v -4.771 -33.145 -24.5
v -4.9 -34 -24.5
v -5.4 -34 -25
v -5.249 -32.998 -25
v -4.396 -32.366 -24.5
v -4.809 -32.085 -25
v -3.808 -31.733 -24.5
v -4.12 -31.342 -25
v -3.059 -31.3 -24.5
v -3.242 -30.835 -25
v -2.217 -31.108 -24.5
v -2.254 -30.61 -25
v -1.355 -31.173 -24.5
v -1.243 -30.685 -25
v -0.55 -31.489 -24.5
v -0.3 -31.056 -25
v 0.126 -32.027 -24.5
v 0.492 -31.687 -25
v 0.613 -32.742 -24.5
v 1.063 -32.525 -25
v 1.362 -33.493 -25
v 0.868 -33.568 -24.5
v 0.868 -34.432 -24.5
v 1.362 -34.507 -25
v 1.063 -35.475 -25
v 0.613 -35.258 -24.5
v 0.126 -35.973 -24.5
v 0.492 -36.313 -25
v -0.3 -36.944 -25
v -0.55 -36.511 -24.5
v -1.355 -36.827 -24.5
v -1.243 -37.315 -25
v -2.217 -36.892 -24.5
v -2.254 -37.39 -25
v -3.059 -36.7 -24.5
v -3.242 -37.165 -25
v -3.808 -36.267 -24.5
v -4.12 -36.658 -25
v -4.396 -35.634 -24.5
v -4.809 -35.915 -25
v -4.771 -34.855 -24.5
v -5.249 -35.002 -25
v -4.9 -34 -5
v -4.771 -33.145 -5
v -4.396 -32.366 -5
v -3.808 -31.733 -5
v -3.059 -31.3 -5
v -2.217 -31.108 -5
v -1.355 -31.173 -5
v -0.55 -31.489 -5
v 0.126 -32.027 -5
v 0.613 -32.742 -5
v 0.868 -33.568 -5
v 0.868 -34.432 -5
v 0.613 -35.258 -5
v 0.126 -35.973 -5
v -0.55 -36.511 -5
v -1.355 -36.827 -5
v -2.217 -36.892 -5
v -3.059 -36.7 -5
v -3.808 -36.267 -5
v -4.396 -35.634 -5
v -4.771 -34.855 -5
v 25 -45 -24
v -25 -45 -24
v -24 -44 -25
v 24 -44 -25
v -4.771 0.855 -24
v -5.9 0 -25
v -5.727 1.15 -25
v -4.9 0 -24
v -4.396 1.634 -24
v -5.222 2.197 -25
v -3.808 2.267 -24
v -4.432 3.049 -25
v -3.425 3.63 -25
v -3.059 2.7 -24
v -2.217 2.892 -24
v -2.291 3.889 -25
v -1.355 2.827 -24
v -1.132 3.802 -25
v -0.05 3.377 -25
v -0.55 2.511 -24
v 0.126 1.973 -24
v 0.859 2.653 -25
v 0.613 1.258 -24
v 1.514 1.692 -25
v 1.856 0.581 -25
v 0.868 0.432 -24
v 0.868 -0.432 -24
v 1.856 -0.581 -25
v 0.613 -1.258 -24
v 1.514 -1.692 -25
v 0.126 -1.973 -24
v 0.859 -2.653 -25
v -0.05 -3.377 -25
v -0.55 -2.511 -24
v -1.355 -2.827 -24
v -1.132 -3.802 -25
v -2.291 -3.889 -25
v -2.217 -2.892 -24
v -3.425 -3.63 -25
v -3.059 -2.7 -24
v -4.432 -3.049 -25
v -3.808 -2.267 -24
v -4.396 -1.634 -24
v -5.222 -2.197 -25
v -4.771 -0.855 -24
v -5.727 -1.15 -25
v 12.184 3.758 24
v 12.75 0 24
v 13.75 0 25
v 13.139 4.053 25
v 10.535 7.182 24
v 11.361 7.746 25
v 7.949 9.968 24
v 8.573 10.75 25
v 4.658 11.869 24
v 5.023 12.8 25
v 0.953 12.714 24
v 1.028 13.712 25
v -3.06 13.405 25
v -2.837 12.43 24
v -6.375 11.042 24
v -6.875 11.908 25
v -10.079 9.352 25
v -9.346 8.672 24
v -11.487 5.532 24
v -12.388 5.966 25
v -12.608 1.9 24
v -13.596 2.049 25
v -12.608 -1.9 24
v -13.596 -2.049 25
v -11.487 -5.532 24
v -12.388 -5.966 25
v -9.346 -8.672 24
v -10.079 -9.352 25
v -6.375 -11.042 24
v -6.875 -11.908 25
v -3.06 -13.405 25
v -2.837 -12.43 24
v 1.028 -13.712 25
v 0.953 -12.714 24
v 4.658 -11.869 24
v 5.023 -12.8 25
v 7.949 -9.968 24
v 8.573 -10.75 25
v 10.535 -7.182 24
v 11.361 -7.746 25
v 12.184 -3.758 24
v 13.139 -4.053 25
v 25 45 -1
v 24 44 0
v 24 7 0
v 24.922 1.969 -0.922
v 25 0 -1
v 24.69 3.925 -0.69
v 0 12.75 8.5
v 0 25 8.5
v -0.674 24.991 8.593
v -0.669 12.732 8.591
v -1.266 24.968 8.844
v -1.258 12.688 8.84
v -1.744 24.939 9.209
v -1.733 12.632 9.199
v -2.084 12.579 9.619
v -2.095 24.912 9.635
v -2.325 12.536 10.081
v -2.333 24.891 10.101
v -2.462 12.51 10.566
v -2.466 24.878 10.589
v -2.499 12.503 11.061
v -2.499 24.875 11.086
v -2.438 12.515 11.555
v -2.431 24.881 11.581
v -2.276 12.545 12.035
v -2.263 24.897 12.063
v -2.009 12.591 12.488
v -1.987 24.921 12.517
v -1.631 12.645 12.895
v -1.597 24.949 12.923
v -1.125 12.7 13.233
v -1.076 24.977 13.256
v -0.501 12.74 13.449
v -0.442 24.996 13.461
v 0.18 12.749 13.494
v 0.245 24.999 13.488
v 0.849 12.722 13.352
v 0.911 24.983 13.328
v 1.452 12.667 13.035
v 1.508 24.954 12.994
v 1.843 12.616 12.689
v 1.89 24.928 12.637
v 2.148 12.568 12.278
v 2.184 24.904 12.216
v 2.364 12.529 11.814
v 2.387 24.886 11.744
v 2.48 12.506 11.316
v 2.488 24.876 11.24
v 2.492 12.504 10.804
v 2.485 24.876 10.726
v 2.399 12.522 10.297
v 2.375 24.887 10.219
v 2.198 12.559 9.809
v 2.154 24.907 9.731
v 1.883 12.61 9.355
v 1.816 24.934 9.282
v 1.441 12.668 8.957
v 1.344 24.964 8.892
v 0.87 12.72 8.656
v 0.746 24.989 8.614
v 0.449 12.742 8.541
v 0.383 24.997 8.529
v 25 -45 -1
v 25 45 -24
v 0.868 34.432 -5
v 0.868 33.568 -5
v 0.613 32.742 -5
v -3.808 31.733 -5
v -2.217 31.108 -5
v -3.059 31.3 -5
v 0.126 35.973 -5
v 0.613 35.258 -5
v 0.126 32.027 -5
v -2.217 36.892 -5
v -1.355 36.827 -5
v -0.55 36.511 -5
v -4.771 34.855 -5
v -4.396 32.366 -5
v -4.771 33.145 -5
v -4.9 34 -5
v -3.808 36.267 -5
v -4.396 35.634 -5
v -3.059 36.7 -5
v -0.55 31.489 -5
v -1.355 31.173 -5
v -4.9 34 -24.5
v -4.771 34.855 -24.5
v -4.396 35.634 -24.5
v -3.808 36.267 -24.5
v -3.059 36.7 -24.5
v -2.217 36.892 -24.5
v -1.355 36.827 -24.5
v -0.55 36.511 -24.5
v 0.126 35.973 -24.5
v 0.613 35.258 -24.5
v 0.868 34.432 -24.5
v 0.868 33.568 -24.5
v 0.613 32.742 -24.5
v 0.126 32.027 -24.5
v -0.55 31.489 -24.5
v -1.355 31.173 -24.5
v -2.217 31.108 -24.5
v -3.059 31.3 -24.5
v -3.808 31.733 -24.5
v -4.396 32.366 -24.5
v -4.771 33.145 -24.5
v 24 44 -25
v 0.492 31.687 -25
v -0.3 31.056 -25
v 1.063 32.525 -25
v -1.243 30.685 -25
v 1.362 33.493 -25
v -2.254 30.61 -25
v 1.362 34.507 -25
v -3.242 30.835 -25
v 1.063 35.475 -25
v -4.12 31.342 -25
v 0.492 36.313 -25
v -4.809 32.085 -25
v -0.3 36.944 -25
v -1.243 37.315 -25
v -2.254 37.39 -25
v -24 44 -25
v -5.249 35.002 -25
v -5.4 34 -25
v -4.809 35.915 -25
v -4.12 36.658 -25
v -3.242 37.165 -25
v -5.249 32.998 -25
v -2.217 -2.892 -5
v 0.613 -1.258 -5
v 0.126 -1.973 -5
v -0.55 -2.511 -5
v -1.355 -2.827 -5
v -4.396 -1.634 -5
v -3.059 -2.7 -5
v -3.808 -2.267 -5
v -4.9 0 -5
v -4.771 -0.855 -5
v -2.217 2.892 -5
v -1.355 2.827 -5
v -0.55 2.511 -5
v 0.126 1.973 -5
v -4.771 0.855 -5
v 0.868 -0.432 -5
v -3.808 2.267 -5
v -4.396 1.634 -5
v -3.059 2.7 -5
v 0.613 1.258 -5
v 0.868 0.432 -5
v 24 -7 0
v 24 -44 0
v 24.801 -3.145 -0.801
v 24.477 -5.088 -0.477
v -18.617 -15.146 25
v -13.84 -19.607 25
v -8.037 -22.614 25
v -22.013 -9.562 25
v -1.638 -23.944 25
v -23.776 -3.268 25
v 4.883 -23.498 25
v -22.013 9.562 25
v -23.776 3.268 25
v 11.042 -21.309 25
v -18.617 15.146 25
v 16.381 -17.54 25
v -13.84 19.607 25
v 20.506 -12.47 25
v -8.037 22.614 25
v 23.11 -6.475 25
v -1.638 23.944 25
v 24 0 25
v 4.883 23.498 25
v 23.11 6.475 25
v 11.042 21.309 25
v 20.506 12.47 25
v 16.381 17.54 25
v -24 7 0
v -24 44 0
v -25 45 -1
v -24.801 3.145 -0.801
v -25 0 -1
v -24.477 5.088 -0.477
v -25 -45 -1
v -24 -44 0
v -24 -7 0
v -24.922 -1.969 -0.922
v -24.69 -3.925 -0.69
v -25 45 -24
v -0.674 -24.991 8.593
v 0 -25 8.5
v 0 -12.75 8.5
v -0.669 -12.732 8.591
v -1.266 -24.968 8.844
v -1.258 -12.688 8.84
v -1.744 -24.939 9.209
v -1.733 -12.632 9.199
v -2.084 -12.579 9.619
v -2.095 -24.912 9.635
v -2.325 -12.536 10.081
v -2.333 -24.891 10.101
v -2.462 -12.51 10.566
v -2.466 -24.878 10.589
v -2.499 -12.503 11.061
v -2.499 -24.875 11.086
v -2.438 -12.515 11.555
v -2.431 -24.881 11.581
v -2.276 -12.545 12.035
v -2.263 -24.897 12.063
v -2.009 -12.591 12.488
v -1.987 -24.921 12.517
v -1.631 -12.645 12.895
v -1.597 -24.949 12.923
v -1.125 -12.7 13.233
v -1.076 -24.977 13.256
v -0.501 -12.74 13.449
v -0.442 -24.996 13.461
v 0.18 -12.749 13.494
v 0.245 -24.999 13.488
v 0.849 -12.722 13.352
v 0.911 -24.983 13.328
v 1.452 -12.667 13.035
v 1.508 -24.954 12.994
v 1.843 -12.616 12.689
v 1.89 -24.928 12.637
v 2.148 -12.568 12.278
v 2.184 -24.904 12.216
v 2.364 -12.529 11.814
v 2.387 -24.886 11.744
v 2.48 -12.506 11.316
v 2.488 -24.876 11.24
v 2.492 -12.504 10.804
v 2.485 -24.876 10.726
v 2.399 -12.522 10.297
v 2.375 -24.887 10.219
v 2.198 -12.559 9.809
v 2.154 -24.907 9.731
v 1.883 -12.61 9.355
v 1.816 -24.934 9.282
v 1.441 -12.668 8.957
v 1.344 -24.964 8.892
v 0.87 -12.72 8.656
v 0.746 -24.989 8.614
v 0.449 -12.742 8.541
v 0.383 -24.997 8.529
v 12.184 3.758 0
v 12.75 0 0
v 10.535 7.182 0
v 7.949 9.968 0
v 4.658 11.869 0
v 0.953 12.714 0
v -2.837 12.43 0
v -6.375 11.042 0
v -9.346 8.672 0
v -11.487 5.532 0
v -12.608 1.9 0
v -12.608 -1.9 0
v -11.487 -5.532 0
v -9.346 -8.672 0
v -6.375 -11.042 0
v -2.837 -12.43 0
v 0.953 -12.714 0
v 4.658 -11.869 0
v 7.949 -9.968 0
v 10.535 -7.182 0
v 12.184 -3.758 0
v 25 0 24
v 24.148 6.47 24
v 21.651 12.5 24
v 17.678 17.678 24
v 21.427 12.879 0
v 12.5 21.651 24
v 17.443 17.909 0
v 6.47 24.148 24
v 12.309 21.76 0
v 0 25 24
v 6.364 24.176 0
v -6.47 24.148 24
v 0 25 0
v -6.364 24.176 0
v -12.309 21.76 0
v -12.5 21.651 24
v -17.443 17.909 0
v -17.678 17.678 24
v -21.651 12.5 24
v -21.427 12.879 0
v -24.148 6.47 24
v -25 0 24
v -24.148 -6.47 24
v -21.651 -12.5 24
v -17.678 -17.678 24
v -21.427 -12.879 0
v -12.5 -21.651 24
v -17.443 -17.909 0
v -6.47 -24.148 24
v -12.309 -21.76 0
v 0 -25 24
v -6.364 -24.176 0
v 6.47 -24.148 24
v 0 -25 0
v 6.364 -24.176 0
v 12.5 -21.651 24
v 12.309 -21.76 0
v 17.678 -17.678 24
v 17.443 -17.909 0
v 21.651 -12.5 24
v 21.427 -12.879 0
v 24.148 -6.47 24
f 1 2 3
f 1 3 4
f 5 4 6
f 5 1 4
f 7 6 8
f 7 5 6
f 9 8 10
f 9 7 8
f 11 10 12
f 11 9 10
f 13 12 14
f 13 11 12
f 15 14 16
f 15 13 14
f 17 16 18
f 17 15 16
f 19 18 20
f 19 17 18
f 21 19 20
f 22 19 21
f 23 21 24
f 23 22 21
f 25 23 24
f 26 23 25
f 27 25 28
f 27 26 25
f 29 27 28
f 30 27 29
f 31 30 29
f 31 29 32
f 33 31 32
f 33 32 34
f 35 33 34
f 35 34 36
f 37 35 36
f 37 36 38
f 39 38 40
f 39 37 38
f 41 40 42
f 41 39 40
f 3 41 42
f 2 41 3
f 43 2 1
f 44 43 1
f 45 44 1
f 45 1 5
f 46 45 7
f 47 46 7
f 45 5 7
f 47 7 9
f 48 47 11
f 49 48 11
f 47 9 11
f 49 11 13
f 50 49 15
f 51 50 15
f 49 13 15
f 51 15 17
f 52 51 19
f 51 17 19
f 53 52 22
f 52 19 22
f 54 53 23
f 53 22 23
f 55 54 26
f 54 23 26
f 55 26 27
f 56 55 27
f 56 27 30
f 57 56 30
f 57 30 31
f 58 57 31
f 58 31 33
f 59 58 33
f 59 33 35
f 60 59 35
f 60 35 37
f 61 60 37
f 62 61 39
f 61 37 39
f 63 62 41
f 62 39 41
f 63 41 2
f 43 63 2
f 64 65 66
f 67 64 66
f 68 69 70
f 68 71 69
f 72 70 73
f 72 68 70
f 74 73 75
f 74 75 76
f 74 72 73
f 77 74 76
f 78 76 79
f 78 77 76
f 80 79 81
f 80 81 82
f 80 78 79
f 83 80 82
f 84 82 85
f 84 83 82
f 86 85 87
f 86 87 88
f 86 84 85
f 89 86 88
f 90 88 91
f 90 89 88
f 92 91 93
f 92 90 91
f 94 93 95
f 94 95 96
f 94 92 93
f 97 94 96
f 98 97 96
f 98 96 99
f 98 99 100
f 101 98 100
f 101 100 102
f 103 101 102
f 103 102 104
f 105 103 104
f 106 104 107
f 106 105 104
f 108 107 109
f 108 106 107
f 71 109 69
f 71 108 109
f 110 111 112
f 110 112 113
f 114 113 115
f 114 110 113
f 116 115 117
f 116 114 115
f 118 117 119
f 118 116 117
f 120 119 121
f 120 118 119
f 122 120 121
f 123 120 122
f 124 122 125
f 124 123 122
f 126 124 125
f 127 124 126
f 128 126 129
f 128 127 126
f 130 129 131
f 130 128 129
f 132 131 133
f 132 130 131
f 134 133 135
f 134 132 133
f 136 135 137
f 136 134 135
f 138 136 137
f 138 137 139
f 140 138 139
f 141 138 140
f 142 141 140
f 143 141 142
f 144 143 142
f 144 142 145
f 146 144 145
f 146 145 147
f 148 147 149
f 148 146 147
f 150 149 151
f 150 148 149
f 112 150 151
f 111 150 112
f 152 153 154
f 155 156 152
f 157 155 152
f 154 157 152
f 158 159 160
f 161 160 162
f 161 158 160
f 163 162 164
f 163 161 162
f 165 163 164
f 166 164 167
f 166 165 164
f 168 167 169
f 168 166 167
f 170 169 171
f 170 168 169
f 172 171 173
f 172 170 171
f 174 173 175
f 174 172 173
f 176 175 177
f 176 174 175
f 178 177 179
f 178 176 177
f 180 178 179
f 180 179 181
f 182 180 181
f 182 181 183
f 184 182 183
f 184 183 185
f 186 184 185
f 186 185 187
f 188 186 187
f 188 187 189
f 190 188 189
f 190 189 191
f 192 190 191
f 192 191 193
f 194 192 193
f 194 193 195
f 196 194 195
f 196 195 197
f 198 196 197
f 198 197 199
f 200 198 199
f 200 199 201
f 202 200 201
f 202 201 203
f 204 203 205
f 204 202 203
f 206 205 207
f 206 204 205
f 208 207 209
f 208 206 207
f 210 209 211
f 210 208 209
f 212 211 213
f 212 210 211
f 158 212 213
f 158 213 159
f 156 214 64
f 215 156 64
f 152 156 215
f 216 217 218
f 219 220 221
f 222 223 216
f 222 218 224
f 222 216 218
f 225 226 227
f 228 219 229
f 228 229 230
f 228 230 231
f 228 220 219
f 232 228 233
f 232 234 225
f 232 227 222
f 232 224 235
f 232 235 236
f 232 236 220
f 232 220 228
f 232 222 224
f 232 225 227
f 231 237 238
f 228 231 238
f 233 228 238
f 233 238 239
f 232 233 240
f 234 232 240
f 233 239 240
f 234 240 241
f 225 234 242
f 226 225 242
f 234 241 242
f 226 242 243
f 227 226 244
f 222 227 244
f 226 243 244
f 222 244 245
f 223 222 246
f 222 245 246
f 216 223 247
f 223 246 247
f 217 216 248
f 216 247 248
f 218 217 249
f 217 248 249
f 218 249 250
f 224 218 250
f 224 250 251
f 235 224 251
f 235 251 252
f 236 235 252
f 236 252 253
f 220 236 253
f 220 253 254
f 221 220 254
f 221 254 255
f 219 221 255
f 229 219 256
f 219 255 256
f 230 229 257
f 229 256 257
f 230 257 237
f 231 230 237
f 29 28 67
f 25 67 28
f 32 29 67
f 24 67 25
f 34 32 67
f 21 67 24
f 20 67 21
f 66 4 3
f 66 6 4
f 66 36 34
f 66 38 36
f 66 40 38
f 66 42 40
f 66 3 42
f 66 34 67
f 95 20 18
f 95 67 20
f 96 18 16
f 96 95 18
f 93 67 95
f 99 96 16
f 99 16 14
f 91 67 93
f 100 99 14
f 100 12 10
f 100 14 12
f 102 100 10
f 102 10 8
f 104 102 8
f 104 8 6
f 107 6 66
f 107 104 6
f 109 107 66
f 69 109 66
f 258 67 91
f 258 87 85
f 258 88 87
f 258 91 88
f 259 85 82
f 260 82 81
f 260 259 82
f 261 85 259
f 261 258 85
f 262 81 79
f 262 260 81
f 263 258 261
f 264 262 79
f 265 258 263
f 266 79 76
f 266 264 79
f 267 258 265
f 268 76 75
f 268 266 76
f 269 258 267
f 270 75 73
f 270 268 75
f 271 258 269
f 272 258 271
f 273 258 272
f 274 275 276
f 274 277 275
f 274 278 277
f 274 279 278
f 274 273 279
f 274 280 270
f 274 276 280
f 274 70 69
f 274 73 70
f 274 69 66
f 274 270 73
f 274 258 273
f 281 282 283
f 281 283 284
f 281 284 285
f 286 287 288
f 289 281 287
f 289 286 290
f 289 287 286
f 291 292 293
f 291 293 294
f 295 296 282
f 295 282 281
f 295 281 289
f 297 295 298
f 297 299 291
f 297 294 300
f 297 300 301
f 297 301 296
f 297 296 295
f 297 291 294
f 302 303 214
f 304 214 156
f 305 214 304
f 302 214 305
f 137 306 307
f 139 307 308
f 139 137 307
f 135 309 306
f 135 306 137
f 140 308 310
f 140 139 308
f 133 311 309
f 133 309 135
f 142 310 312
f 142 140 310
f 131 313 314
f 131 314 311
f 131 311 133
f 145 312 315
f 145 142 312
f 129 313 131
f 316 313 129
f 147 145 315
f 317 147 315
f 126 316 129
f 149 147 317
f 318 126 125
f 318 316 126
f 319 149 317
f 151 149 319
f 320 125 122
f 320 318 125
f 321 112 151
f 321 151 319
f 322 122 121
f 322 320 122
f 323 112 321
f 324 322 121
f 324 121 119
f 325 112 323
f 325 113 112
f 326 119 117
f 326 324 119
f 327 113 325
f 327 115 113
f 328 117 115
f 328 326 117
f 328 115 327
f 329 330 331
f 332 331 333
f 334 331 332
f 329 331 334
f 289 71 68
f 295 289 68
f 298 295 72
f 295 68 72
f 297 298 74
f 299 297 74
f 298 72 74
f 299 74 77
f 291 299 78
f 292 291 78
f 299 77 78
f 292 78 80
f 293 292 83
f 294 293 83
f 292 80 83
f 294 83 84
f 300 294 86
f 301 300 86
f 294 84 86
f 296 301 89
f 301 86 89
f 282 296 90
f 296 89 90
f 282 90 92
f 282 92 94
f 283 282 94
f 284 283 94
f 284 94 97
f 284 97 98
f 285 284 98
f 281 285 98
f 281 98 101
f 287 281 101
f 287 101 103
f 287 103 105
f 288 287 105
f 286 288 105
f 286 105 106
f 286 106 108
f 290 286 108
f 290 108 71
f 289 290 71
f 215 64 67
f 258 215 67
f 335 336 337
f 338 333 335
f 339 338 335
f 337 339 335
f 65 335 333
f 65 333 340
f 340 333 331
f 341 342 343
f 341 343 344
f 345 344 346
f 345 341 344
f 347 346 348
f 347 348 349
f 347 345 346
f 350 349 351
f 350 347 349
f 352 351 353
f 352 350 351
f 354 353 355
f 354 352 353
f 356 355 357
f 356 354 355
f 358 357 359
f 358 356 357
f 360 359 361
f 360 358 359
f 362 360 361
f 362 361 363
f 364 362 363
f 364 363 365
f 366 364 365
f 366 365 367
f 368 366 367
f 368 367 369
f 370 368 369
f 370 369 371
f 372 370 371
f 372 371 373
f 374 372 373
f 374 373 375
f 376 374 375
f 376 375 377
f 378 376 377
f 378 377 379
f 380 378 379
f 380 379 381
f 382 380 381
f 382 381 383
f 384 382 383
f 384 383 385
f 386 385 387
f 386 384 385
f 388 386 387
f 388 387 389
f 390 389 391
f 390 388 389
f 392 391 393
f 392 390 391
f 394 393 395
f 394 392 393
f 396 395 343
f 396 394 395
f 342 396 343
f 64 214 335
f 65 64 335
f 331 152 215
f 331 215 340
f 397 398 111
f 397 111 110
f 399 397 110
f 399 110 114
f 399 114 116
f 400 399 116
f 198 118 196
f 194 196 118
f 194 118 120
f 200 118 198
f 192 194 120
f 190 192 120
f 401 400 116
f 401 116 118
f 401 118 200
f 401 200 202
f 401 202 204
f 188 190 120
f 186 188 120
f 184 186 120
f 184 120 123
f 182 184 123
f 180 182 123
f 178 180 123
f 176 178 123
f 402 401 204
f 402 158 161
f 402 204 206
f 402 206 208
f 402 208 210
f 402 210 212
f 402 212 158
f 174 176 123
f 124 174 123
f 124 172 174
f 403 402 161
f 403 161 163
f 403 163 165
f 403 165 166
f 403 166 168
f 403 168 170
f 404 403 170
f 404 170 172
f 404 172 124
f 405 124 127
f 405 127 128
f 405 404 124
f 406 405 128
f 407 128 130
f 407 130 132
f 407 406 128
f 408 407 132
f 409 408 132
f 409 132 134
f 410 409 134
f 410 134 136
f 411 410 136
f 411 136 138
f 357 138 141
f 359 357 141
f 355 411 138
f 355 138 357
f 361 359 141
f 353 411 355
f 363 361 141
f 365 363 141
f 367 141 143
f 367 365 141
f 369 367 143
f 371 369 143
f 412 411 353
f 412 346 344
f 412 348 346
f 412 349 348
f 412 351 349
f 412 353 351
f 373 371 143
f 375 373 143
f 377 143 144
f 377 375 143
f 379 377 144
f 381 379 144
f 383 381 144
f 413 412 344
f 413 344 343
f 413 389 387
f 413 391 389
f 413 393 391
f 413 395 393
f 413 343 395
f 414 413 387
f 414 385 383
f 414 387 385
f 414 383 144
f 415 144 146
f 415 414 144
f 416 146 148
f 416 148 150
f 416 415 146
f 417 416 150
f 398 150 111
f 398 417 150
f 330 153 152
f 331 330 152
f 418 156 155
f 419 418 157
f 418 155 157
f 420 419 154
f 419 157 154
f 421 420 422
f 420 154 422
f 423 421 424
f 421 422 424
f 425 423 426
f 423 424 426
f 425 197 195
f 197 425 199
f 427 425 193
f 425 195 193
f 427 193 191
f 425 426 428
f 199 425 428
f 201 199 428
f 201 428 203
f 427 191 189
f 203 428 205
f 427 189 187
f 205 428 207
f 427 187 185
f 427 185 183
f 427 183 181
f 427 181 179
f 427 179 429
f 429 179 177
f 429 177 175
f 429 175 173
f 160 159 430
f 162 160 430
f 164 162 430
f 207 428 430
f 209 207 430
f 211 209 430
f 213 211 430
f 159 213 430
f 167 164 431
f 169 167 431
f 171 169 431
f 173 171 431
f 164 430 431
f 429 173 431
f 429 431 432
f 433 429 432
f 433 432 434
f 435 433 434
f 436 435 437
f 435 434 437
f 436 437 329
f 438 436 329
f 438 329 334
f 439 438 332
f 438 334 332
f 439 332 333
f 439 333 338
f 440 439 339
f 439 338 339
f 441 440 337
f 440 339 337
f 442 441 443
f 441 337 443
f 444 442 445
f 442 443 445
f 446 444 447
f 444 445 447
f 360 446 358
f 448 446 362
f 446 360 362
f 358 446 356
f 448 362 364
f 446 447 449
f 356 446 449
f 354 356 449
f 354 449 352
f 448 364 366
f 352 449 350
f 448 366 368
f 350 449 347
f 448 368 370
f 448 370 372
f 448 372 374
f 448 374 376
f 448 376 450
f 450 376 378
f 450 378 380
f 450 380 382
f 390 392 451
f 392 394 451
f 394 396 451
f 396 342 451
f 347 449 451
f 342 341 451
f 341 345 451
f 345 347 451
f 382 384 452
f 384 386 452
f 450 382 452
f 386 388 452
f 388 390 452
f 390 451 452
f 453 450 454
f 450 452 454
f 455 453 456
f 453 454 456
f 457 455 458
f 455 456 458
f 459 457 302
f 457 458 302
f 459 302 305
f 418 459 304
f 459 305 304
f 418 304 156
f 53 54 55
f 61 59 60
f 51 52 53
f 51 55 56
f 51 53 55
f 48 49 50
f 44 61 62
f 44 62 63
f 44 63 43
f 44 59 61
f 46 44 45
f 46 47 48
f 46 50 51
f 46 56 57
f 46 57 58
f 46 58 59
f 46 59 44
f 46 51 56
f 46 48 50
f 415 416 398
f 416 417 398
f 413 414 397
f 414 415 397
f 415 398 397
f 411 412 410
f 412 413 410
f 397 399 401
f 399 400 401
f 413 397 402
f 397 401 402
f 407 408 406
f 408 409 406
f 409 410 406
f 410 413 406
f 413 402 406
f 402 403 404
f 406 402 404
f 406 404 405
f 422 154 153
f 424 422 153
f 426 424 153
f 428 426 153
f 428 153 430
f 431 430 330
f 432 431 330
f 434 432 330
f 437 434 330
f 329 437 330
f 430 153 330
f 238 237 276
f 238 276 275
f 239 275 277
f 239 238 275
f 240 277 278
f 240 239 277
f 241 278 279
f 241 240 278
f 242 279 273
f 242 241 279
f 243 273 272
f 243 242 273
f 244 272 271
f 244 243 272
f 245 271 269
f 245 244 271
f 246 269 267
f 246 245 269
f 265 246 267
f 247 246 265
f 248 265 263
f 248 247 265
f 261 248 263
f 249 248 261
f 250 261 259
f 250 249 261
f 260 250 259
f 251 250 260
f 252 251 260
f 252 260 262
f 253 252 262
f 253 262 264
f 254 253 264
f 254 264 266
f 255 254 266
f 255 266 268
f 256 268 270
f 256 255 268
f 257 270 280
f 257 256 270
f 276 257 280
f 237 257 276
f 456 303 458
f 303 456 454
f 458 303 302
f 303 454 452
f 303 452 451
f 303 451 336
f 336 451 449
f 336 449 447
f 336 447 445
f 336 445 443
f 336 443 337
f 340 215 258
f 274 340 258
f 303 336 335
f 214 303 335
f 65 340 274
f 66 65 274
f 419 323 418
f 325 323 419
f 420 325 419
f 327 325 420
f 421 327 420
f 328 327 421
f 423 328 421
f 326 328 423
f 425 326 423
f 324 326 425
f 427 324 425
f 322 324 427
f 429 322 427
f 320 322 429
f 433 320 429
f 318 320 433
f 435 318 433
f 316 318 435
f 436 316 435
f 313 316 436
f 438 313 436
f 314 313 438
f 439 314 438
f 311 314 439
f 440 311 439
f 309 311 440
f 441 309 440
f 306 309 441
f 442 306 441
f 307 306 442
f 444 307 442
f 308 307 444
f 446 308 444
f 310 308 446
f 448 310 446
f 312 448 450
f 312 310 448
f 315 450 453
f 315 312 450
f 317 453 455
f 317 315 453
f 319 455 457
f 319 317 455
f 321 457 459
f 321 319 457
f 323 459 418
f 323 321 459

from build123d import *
from build123d.topology import SkipClean

# Parameters (mm, degrees)
SKETCH_1_R               = 25
SKETCH_1_R_2             = 12.75
EXTRUDE_1_DEPTH          = 25
CUT_EXTRUDE_1_DEPTH      = 30
CUT_EXTRUDE_1_DEPTH_BACK = 30
SKETCH_2_R               = 2.5
SKETCH_3_W               = 50
SKETCH_3_H               = 90
EXTRUDE_2_DEPTH          = 25
CHAMFER_1_SIZE           = 1
SKETCH_4_R               = 2.9
CUT_EXTRUDE_2_DEPTH      = 20
CHAMFER_2_SIZE           = 1
SKETCH_5_R               = 2.9
CUT_EXTRUDE_3_DEPTH      = 20
CHAMFER_3_SIZE           = 0.5


with BuildPart() as part:
    # 草图1 → 凸台-拉伸1 (new body)
    with BuildSketch(Plane.XY):
        Circle(SKETCH_1_R)
        Circle(SKETCH_1_R_2, mode=Mode.SUBTRACT)
    extrude(amount=EXTRUDE_1_DEPTH)

    # 草图2 → 切除-拉伸1 (cut, two sides: drawn at the far end of the back side and taken through both)
    with BuildSketch(Plane(origin=(0, 0, 0), x_dir=(1, 0, 0), z_dir=(0, 1, 0)).offset(-CUT_EXTRUDE_1_DEPTH_BACK)):
        with Locations(Location((0, -11, 0), (0, 0, 90))):
            Circle(SKETCH_2_R)
    extrude(amount=CUT_EXTRUDE_1_DEPTH + CUT_EXTRUDE_1_DEPTH_BACK, mode=Mode.SUBTRACT)

    # 草图3 → 凸台-拉伸2 (add)
    with BuildSketch(Plane(origin=(0, 0, 0), x_dir=(-1, 0, 0), z_dir=(0, 0, -1))):
        Rectangle(SKETCH_3_W, SKETCH_3_H)
    extrude(amount=EXTRUDE_2_DEPTH)

    # 倒角1
    chamfer_1_edges = [part.edges().sort_by_distance(p)[0] for p in [
        (-25, 0, 25),
        (-12.75, 0, 25),
    ]]
    chamfer(chamfer_1_edges, length=CHAMFER_1_SIZE)

    # 草图4 → 切除-拉伸2 (cut)
    with BuildSketch(Plane(origin=(0, 0, -25), x_dir=(-1, 0, 0), z_dir=(0, 0, -1))):
        with Locations((2, 0)):
            Circle(SKETCH_4_R)
    extrude(amount=-CUT_EXTRUDE_2_DEPTH, mode=Mode.SUBTRACT)

    # 倒角2
    # the kernel refuses this chamfer: 1 mm, written as the material it takes off along each edge
    with BuildSketch(Plane(origin=(25, 0, 0), x_dir=(-0.9996219169112968, 0, 0.02749587661058639), z_dir=(0, 1, 0))) as chamfer_2_piece_1_section:
        Polygon((CHAMFER_2_SIZE * 0.999621916911, -CHAMFER_2_SIZE * 0.0274958766106), (-CHAMFER_2_SIZE * 0.0274958766106, -CHAMFER_2_SIZE * 0.999621916911), (0, 0), align=None)
    chamfer_2_piece_1 = extrude(amount=47.571682988, mode=Mode.PRIVATE)
    chamfer_2_piece_1 = chamfer_2_piece_1 - Plane(origin=(0, 0, -0.337643677), x_dir=(1, 0, 0), z_dir=(0, 0, -1)) * Cylinder(25, 100, mode=Mode.PRIVATE)
    add(chamfer_2_piece_1, mode=Mode.SUBTRACT)
    with BuildSketch(Plane(origin=(25, -47.571682988, 0), x_dir=(-0.9996219169112968, 0, 0.02749587661058639), z_dir=(0, 1, 0))) as chamfer_2_piece_2_section:
        Polygon((CHAMFER_2_SIZE * 0.999621916911, -CHAMFER_2_SIZE * 0.0274958766106), (-CHAMFER_2_SIZE * 0.0274958766106, -CHAMFER_2_SIZE * 0.999621916911), (0, 0), align=None)
    chamfer_2_piece_2 = extrude(amount=47.571682988, mode=Mode.PRIVATE)
    chamfer_2_piece_2 = chamfer_2_piece_2 - Plane(origin=(0, 0, -0.337643676), x_dir=(1, 0, 0), z_dir=(0, 0, -1)) * Cylinder(25, 100, mode=Mode.PRIVATE)
    add(chamfer_2_piece_2, mode=Mode.SUBTRACT)
    with BuildSketch(Plane(origin=(-27.571682988, -45, 0), x_dir=(0, 0.9996219169112968, 0.027495876610586292), z_dir=(1, 0, 0)), Plane(origin=(27.571682988, 45, 0), x_dir=(0, -0.9996219169112968, 0.027495876610586292), z_dir=(-1, 0, 0)), Plane(origin=(-27.571682988, -45, -25), x_dir=(0, -0.0274958766105891, 0.9996219169112968), z_dir=(1, 0, 0)), Plane(origin=(27.571682988, 45, -25), x_dir=(0, 0.0274958766105891, 0.9996219169112968), z_dir=(-1, 0, 0))) as chamfer_2_piece_3:
        Polygon((CHAMFER_2_SIZE * 0.999621916911, -CHAMFER_2_SIZE * 0.0274958766106), (-CHAMFER_2_SIZE * 0.0274958766106, -CHAMFER_2_SIZE * 0.999621916911), (0, 0), align=None)
    extrude(amount=55.143365976, mode=Mode.SUBTRACT)
    with BuildSketch(Plane(origin=(-25, -1.3e-08, 0), x_dir=(0.9996219169112968, 0, 0.02749587661058639), z_dir=(0, -1, 0))) as chamfer_2_piece_4_section:
        Polygon((CHAMFER_2_SIZE * 0.999621916911, -CHAMFER_2_SIZE * 0.0274958766106), (-CHAMFER_2_SIZE * 0.0274958766106, -CHAMFER_2_SIZE * 0.999621916911), (0, 0), align=None)
    chamfer_2_piece_4 = extrude(amount=47.571682975, mode=Mode.PRIVATE)
    chamfer_2_piece_4 = chamfer_2_piece_4 - Plane(origin=(0, 0, -0.337643677), x_dir=(1, 0, 0), z_dir=(0, 0, -1)) * Cylinder(25, 100, mode=Mode.PRIVATE)
    add(chamfer_2_piece_4, mode=Mode.SUBTRACT)
    with BuildSketch(Plane(origin=(-25, 47.571682988, 0), x_dir=(0.9996219169112968, 0, 0.02749587661058639), z_dir=(0, -1, 0))) as chamfer_2_piece_5_section:
        Polygon((CHAMFER_2_SIZE * 0.999621916911, -CHAMFER_2_SIZE * 0.0274958766106), (-CHAMFER_2_SIZE * 0.0274958766106, -CHAMFER_2_SIZE * 0.999621916911), (0, 0), align=None)
    chamfer_2_piece_5 = extrude(amount=47.571683001, mode=Mode.PRIVATE)
    chamfer_2_piece_5 = chamfer_2_piece_5 - Plane(origin=(0, 0, -0.337643677), x_dir=(1, 0, 0), z_dir=(0, 0, -1)) * Cylinder(25, 100, mode=Mode.PRIVATE)
    add(chamfer_2_piece_5, mode=Mode.SUBTRACT)
    with BuildSketch(Plane(origin=(25, -47.571682988, -25), x_dir=(0.027495876610585647, 0, 0.9996219169112968), z_dir=(0, 1, 0)), Plane(origin=(-25, 47.571682988, -25), x_dir=(-0.027495876610585647, 0, 0.9996219169112968), z_dir=(0, -1, 0))) as chamfer_2_piece_6:
        Polygon((CHAMFER_2_SIZE * 0.999621916911, -CHAMFER_2_SIZE * 0.0274958766106), (-CHAMFER_2_SIZE * 0.0274958766106, -CHAMFER_2_SIZE * 0.999621916911), (0, 0), align=None)
    extrude(amount=95.143365976, mode=Mode.SUBTRACT)
    with BuildSketch(Plane(origin=(-2, 0, -25), x_dir=(-1, 0, 0), z_dir=(0, -1, 0))) as chamfer_2_piece_7:
        Polygon((2.9 + CHAMFER_2_SIZE, 0), (2.9, -CHAMFER_2_SIZE), (2.9, 0), align=None)
    revolve(axis=Axis((-2, 0, -25), (0, 0, -1)), mode=Mode.SUBTRACT)

    # 草图5 → 切除-拉伸3 (cut)
    with SkipClean():  # the faces are left unmerged after this step: merging them gives an invalid solid
        with BuildSketch(Plane(origin=(0, 0, -25), x_dir=(-1, 0, 0), z_dir=(0, 0, -1))):
            with Locations((2, 34)):
                Circle(SKETCH_5_R)
            with Locations((2, -34)):
                Circle(SKETCH_5_R)
        extrude(amount=-CUT_EXTRUDE_3_DEPTH, mode=Mode.SUBTRACT)

    # 倒角3
    chamfer_3_edges = [part.edges().sort_by_distance(p)[0] for p in [
        (0.9, 34, -25),
        (0.9, -34, -25),
    ]]
    chamfer(chamfer_3_edges, length=CHAMFER_3_SIZE)


solid = part.part
